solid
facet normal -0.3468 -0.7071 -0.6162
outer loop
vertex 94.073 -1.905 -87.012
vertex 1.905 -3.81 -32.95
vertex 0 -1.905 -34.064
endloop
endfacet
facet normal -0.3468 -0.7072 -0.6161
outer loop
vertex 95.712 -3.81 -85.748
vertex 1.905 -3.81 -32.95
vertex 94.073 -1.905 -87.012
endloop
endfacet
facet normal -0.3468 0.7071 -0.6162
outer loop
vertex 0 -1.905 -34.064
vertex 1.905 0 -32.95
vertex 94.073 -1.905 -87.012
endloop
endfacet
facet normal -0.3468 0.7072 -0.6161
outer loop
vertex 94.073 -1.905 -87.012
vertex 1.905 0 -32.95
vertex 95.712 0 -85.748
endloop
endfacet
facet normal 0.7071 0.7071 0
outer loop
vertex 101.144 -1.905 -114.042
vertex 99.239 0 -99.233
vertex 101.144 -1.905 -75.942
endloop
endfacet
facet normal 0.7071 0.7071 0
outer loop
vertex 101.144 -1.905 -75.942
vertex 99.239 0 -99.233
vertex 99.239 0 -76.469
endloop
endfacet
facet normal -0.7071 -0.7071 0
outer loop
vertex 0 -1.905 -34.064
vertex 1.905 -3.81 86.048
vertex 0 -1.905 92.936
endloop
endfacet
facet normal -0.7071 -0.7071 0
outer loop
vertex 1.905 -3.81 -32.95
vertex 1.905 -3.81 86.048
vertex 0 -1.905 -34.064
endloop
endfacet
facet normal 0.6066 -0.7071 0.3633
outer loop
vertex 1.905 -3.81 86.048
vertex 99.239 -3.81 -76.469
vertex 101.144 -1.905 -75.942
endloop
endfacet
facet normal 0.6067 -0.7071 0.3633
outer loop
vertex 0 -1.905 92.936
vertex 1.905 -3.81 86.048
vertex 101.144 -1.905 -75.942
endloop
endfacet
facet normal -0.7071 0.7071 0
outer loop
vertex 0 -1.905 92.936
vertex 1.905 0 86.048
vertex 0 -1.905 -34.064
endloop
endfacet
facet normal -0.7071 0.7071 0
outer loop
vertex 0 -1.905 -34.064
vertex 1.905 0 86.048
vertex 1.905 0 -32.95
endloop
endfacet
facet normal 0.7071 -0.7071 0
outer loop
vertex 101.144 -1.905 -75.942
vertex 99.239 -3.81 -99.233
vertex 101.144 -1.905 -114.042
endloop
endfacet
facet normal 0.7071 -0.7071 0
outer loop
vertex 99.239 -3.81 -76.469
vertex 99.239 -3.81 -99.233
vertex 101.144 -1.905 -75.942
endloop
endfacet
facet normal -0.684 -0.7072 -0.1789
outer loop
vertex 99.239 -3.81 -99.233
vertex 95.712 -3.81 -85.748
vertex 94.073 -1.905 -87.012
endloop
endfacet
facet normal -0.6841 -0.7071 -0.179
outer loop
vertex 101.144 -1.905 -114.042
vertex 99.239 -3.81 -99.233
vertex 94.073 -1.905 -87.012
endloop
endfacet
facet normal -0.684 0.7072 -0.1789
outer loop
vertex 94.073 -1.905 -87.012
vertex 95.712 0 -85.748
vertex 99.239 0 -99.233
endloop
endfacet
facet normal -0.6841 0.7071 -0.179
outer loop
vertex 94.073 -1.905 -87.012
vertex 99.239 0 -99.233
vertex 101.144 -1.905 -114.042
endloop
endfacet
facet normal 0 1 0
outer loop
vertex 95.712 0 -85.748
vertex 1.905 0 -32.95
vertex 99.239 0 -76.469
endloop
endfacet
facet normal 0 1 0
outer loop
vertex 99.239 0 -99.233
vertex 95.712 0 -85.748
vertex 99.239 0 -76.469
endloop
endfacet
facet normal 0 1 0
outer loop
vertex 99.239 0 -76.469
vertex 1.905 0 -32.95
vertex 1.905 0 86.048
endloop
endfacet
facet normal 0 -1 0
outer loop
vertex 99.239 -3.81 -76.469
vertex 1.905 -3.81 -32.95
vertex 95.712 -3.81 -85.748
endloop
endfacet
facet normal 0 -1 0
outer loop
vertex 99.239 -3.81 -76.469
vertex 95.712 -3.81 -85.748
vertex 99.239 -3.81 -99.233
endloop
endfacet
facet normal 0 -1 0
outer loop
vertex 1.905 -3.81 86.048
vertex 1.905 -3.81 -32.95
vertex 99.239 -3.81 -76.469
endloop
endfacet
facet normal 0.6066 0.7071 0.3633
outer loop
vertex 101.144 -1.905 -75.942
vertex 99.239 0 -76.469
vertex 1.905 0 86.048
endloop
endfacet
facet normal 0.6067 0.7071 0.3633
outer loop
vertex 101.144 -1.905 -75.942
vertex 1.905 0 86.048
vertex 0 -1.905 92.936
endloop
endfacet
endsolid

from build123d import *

# Parameters (mm, degrees)
F1_DEPTH = 3.81
F2_SIZE  = 1.90499


# Not quite as in the source:
# - a fillet or chamfer is up to 0.001 mm smaller than in the source, because OpenCascade refuses the exact size


with BuildPart() as f1:
    # F0 (on Front) → F1 (new body)
    with BuildSketch(Plane.XZ):
        Polygon((101.1442430278, -75.9420931081), (0, 92.935864608), (0, -34.064135392), (94.0731655183, -87.0116757444), (101.1442430278, -114.0420931081), align=None)
    extrude(amount=F1_DEPTH)

    # F2 (size 1.905 in the source; OpenCascade refuses exactly that, so slightly less here)
    f2_edges = [f1.edges().sort_by_distance(p)[0] for p in [
        (47.036583, -3.81, -60.537906),
        (97.608704, -3.81, -100.526884),
        (101.144243, -3.81, -94.992093),
        (50.572122, -3.81, 8.496886),
        (0, -3.81, 29.435865),
        (47.036583, 0, -60.537906),
        (97.608704, 0, -100.526884),
        (101.144243, 0, -94.992093),
        (50.572122, 0, 8.496886),
        (0, 0, 29.435865),
    ]]
    chamfer(f2_edges, length=F2_SIZE)


solid = f1.part
